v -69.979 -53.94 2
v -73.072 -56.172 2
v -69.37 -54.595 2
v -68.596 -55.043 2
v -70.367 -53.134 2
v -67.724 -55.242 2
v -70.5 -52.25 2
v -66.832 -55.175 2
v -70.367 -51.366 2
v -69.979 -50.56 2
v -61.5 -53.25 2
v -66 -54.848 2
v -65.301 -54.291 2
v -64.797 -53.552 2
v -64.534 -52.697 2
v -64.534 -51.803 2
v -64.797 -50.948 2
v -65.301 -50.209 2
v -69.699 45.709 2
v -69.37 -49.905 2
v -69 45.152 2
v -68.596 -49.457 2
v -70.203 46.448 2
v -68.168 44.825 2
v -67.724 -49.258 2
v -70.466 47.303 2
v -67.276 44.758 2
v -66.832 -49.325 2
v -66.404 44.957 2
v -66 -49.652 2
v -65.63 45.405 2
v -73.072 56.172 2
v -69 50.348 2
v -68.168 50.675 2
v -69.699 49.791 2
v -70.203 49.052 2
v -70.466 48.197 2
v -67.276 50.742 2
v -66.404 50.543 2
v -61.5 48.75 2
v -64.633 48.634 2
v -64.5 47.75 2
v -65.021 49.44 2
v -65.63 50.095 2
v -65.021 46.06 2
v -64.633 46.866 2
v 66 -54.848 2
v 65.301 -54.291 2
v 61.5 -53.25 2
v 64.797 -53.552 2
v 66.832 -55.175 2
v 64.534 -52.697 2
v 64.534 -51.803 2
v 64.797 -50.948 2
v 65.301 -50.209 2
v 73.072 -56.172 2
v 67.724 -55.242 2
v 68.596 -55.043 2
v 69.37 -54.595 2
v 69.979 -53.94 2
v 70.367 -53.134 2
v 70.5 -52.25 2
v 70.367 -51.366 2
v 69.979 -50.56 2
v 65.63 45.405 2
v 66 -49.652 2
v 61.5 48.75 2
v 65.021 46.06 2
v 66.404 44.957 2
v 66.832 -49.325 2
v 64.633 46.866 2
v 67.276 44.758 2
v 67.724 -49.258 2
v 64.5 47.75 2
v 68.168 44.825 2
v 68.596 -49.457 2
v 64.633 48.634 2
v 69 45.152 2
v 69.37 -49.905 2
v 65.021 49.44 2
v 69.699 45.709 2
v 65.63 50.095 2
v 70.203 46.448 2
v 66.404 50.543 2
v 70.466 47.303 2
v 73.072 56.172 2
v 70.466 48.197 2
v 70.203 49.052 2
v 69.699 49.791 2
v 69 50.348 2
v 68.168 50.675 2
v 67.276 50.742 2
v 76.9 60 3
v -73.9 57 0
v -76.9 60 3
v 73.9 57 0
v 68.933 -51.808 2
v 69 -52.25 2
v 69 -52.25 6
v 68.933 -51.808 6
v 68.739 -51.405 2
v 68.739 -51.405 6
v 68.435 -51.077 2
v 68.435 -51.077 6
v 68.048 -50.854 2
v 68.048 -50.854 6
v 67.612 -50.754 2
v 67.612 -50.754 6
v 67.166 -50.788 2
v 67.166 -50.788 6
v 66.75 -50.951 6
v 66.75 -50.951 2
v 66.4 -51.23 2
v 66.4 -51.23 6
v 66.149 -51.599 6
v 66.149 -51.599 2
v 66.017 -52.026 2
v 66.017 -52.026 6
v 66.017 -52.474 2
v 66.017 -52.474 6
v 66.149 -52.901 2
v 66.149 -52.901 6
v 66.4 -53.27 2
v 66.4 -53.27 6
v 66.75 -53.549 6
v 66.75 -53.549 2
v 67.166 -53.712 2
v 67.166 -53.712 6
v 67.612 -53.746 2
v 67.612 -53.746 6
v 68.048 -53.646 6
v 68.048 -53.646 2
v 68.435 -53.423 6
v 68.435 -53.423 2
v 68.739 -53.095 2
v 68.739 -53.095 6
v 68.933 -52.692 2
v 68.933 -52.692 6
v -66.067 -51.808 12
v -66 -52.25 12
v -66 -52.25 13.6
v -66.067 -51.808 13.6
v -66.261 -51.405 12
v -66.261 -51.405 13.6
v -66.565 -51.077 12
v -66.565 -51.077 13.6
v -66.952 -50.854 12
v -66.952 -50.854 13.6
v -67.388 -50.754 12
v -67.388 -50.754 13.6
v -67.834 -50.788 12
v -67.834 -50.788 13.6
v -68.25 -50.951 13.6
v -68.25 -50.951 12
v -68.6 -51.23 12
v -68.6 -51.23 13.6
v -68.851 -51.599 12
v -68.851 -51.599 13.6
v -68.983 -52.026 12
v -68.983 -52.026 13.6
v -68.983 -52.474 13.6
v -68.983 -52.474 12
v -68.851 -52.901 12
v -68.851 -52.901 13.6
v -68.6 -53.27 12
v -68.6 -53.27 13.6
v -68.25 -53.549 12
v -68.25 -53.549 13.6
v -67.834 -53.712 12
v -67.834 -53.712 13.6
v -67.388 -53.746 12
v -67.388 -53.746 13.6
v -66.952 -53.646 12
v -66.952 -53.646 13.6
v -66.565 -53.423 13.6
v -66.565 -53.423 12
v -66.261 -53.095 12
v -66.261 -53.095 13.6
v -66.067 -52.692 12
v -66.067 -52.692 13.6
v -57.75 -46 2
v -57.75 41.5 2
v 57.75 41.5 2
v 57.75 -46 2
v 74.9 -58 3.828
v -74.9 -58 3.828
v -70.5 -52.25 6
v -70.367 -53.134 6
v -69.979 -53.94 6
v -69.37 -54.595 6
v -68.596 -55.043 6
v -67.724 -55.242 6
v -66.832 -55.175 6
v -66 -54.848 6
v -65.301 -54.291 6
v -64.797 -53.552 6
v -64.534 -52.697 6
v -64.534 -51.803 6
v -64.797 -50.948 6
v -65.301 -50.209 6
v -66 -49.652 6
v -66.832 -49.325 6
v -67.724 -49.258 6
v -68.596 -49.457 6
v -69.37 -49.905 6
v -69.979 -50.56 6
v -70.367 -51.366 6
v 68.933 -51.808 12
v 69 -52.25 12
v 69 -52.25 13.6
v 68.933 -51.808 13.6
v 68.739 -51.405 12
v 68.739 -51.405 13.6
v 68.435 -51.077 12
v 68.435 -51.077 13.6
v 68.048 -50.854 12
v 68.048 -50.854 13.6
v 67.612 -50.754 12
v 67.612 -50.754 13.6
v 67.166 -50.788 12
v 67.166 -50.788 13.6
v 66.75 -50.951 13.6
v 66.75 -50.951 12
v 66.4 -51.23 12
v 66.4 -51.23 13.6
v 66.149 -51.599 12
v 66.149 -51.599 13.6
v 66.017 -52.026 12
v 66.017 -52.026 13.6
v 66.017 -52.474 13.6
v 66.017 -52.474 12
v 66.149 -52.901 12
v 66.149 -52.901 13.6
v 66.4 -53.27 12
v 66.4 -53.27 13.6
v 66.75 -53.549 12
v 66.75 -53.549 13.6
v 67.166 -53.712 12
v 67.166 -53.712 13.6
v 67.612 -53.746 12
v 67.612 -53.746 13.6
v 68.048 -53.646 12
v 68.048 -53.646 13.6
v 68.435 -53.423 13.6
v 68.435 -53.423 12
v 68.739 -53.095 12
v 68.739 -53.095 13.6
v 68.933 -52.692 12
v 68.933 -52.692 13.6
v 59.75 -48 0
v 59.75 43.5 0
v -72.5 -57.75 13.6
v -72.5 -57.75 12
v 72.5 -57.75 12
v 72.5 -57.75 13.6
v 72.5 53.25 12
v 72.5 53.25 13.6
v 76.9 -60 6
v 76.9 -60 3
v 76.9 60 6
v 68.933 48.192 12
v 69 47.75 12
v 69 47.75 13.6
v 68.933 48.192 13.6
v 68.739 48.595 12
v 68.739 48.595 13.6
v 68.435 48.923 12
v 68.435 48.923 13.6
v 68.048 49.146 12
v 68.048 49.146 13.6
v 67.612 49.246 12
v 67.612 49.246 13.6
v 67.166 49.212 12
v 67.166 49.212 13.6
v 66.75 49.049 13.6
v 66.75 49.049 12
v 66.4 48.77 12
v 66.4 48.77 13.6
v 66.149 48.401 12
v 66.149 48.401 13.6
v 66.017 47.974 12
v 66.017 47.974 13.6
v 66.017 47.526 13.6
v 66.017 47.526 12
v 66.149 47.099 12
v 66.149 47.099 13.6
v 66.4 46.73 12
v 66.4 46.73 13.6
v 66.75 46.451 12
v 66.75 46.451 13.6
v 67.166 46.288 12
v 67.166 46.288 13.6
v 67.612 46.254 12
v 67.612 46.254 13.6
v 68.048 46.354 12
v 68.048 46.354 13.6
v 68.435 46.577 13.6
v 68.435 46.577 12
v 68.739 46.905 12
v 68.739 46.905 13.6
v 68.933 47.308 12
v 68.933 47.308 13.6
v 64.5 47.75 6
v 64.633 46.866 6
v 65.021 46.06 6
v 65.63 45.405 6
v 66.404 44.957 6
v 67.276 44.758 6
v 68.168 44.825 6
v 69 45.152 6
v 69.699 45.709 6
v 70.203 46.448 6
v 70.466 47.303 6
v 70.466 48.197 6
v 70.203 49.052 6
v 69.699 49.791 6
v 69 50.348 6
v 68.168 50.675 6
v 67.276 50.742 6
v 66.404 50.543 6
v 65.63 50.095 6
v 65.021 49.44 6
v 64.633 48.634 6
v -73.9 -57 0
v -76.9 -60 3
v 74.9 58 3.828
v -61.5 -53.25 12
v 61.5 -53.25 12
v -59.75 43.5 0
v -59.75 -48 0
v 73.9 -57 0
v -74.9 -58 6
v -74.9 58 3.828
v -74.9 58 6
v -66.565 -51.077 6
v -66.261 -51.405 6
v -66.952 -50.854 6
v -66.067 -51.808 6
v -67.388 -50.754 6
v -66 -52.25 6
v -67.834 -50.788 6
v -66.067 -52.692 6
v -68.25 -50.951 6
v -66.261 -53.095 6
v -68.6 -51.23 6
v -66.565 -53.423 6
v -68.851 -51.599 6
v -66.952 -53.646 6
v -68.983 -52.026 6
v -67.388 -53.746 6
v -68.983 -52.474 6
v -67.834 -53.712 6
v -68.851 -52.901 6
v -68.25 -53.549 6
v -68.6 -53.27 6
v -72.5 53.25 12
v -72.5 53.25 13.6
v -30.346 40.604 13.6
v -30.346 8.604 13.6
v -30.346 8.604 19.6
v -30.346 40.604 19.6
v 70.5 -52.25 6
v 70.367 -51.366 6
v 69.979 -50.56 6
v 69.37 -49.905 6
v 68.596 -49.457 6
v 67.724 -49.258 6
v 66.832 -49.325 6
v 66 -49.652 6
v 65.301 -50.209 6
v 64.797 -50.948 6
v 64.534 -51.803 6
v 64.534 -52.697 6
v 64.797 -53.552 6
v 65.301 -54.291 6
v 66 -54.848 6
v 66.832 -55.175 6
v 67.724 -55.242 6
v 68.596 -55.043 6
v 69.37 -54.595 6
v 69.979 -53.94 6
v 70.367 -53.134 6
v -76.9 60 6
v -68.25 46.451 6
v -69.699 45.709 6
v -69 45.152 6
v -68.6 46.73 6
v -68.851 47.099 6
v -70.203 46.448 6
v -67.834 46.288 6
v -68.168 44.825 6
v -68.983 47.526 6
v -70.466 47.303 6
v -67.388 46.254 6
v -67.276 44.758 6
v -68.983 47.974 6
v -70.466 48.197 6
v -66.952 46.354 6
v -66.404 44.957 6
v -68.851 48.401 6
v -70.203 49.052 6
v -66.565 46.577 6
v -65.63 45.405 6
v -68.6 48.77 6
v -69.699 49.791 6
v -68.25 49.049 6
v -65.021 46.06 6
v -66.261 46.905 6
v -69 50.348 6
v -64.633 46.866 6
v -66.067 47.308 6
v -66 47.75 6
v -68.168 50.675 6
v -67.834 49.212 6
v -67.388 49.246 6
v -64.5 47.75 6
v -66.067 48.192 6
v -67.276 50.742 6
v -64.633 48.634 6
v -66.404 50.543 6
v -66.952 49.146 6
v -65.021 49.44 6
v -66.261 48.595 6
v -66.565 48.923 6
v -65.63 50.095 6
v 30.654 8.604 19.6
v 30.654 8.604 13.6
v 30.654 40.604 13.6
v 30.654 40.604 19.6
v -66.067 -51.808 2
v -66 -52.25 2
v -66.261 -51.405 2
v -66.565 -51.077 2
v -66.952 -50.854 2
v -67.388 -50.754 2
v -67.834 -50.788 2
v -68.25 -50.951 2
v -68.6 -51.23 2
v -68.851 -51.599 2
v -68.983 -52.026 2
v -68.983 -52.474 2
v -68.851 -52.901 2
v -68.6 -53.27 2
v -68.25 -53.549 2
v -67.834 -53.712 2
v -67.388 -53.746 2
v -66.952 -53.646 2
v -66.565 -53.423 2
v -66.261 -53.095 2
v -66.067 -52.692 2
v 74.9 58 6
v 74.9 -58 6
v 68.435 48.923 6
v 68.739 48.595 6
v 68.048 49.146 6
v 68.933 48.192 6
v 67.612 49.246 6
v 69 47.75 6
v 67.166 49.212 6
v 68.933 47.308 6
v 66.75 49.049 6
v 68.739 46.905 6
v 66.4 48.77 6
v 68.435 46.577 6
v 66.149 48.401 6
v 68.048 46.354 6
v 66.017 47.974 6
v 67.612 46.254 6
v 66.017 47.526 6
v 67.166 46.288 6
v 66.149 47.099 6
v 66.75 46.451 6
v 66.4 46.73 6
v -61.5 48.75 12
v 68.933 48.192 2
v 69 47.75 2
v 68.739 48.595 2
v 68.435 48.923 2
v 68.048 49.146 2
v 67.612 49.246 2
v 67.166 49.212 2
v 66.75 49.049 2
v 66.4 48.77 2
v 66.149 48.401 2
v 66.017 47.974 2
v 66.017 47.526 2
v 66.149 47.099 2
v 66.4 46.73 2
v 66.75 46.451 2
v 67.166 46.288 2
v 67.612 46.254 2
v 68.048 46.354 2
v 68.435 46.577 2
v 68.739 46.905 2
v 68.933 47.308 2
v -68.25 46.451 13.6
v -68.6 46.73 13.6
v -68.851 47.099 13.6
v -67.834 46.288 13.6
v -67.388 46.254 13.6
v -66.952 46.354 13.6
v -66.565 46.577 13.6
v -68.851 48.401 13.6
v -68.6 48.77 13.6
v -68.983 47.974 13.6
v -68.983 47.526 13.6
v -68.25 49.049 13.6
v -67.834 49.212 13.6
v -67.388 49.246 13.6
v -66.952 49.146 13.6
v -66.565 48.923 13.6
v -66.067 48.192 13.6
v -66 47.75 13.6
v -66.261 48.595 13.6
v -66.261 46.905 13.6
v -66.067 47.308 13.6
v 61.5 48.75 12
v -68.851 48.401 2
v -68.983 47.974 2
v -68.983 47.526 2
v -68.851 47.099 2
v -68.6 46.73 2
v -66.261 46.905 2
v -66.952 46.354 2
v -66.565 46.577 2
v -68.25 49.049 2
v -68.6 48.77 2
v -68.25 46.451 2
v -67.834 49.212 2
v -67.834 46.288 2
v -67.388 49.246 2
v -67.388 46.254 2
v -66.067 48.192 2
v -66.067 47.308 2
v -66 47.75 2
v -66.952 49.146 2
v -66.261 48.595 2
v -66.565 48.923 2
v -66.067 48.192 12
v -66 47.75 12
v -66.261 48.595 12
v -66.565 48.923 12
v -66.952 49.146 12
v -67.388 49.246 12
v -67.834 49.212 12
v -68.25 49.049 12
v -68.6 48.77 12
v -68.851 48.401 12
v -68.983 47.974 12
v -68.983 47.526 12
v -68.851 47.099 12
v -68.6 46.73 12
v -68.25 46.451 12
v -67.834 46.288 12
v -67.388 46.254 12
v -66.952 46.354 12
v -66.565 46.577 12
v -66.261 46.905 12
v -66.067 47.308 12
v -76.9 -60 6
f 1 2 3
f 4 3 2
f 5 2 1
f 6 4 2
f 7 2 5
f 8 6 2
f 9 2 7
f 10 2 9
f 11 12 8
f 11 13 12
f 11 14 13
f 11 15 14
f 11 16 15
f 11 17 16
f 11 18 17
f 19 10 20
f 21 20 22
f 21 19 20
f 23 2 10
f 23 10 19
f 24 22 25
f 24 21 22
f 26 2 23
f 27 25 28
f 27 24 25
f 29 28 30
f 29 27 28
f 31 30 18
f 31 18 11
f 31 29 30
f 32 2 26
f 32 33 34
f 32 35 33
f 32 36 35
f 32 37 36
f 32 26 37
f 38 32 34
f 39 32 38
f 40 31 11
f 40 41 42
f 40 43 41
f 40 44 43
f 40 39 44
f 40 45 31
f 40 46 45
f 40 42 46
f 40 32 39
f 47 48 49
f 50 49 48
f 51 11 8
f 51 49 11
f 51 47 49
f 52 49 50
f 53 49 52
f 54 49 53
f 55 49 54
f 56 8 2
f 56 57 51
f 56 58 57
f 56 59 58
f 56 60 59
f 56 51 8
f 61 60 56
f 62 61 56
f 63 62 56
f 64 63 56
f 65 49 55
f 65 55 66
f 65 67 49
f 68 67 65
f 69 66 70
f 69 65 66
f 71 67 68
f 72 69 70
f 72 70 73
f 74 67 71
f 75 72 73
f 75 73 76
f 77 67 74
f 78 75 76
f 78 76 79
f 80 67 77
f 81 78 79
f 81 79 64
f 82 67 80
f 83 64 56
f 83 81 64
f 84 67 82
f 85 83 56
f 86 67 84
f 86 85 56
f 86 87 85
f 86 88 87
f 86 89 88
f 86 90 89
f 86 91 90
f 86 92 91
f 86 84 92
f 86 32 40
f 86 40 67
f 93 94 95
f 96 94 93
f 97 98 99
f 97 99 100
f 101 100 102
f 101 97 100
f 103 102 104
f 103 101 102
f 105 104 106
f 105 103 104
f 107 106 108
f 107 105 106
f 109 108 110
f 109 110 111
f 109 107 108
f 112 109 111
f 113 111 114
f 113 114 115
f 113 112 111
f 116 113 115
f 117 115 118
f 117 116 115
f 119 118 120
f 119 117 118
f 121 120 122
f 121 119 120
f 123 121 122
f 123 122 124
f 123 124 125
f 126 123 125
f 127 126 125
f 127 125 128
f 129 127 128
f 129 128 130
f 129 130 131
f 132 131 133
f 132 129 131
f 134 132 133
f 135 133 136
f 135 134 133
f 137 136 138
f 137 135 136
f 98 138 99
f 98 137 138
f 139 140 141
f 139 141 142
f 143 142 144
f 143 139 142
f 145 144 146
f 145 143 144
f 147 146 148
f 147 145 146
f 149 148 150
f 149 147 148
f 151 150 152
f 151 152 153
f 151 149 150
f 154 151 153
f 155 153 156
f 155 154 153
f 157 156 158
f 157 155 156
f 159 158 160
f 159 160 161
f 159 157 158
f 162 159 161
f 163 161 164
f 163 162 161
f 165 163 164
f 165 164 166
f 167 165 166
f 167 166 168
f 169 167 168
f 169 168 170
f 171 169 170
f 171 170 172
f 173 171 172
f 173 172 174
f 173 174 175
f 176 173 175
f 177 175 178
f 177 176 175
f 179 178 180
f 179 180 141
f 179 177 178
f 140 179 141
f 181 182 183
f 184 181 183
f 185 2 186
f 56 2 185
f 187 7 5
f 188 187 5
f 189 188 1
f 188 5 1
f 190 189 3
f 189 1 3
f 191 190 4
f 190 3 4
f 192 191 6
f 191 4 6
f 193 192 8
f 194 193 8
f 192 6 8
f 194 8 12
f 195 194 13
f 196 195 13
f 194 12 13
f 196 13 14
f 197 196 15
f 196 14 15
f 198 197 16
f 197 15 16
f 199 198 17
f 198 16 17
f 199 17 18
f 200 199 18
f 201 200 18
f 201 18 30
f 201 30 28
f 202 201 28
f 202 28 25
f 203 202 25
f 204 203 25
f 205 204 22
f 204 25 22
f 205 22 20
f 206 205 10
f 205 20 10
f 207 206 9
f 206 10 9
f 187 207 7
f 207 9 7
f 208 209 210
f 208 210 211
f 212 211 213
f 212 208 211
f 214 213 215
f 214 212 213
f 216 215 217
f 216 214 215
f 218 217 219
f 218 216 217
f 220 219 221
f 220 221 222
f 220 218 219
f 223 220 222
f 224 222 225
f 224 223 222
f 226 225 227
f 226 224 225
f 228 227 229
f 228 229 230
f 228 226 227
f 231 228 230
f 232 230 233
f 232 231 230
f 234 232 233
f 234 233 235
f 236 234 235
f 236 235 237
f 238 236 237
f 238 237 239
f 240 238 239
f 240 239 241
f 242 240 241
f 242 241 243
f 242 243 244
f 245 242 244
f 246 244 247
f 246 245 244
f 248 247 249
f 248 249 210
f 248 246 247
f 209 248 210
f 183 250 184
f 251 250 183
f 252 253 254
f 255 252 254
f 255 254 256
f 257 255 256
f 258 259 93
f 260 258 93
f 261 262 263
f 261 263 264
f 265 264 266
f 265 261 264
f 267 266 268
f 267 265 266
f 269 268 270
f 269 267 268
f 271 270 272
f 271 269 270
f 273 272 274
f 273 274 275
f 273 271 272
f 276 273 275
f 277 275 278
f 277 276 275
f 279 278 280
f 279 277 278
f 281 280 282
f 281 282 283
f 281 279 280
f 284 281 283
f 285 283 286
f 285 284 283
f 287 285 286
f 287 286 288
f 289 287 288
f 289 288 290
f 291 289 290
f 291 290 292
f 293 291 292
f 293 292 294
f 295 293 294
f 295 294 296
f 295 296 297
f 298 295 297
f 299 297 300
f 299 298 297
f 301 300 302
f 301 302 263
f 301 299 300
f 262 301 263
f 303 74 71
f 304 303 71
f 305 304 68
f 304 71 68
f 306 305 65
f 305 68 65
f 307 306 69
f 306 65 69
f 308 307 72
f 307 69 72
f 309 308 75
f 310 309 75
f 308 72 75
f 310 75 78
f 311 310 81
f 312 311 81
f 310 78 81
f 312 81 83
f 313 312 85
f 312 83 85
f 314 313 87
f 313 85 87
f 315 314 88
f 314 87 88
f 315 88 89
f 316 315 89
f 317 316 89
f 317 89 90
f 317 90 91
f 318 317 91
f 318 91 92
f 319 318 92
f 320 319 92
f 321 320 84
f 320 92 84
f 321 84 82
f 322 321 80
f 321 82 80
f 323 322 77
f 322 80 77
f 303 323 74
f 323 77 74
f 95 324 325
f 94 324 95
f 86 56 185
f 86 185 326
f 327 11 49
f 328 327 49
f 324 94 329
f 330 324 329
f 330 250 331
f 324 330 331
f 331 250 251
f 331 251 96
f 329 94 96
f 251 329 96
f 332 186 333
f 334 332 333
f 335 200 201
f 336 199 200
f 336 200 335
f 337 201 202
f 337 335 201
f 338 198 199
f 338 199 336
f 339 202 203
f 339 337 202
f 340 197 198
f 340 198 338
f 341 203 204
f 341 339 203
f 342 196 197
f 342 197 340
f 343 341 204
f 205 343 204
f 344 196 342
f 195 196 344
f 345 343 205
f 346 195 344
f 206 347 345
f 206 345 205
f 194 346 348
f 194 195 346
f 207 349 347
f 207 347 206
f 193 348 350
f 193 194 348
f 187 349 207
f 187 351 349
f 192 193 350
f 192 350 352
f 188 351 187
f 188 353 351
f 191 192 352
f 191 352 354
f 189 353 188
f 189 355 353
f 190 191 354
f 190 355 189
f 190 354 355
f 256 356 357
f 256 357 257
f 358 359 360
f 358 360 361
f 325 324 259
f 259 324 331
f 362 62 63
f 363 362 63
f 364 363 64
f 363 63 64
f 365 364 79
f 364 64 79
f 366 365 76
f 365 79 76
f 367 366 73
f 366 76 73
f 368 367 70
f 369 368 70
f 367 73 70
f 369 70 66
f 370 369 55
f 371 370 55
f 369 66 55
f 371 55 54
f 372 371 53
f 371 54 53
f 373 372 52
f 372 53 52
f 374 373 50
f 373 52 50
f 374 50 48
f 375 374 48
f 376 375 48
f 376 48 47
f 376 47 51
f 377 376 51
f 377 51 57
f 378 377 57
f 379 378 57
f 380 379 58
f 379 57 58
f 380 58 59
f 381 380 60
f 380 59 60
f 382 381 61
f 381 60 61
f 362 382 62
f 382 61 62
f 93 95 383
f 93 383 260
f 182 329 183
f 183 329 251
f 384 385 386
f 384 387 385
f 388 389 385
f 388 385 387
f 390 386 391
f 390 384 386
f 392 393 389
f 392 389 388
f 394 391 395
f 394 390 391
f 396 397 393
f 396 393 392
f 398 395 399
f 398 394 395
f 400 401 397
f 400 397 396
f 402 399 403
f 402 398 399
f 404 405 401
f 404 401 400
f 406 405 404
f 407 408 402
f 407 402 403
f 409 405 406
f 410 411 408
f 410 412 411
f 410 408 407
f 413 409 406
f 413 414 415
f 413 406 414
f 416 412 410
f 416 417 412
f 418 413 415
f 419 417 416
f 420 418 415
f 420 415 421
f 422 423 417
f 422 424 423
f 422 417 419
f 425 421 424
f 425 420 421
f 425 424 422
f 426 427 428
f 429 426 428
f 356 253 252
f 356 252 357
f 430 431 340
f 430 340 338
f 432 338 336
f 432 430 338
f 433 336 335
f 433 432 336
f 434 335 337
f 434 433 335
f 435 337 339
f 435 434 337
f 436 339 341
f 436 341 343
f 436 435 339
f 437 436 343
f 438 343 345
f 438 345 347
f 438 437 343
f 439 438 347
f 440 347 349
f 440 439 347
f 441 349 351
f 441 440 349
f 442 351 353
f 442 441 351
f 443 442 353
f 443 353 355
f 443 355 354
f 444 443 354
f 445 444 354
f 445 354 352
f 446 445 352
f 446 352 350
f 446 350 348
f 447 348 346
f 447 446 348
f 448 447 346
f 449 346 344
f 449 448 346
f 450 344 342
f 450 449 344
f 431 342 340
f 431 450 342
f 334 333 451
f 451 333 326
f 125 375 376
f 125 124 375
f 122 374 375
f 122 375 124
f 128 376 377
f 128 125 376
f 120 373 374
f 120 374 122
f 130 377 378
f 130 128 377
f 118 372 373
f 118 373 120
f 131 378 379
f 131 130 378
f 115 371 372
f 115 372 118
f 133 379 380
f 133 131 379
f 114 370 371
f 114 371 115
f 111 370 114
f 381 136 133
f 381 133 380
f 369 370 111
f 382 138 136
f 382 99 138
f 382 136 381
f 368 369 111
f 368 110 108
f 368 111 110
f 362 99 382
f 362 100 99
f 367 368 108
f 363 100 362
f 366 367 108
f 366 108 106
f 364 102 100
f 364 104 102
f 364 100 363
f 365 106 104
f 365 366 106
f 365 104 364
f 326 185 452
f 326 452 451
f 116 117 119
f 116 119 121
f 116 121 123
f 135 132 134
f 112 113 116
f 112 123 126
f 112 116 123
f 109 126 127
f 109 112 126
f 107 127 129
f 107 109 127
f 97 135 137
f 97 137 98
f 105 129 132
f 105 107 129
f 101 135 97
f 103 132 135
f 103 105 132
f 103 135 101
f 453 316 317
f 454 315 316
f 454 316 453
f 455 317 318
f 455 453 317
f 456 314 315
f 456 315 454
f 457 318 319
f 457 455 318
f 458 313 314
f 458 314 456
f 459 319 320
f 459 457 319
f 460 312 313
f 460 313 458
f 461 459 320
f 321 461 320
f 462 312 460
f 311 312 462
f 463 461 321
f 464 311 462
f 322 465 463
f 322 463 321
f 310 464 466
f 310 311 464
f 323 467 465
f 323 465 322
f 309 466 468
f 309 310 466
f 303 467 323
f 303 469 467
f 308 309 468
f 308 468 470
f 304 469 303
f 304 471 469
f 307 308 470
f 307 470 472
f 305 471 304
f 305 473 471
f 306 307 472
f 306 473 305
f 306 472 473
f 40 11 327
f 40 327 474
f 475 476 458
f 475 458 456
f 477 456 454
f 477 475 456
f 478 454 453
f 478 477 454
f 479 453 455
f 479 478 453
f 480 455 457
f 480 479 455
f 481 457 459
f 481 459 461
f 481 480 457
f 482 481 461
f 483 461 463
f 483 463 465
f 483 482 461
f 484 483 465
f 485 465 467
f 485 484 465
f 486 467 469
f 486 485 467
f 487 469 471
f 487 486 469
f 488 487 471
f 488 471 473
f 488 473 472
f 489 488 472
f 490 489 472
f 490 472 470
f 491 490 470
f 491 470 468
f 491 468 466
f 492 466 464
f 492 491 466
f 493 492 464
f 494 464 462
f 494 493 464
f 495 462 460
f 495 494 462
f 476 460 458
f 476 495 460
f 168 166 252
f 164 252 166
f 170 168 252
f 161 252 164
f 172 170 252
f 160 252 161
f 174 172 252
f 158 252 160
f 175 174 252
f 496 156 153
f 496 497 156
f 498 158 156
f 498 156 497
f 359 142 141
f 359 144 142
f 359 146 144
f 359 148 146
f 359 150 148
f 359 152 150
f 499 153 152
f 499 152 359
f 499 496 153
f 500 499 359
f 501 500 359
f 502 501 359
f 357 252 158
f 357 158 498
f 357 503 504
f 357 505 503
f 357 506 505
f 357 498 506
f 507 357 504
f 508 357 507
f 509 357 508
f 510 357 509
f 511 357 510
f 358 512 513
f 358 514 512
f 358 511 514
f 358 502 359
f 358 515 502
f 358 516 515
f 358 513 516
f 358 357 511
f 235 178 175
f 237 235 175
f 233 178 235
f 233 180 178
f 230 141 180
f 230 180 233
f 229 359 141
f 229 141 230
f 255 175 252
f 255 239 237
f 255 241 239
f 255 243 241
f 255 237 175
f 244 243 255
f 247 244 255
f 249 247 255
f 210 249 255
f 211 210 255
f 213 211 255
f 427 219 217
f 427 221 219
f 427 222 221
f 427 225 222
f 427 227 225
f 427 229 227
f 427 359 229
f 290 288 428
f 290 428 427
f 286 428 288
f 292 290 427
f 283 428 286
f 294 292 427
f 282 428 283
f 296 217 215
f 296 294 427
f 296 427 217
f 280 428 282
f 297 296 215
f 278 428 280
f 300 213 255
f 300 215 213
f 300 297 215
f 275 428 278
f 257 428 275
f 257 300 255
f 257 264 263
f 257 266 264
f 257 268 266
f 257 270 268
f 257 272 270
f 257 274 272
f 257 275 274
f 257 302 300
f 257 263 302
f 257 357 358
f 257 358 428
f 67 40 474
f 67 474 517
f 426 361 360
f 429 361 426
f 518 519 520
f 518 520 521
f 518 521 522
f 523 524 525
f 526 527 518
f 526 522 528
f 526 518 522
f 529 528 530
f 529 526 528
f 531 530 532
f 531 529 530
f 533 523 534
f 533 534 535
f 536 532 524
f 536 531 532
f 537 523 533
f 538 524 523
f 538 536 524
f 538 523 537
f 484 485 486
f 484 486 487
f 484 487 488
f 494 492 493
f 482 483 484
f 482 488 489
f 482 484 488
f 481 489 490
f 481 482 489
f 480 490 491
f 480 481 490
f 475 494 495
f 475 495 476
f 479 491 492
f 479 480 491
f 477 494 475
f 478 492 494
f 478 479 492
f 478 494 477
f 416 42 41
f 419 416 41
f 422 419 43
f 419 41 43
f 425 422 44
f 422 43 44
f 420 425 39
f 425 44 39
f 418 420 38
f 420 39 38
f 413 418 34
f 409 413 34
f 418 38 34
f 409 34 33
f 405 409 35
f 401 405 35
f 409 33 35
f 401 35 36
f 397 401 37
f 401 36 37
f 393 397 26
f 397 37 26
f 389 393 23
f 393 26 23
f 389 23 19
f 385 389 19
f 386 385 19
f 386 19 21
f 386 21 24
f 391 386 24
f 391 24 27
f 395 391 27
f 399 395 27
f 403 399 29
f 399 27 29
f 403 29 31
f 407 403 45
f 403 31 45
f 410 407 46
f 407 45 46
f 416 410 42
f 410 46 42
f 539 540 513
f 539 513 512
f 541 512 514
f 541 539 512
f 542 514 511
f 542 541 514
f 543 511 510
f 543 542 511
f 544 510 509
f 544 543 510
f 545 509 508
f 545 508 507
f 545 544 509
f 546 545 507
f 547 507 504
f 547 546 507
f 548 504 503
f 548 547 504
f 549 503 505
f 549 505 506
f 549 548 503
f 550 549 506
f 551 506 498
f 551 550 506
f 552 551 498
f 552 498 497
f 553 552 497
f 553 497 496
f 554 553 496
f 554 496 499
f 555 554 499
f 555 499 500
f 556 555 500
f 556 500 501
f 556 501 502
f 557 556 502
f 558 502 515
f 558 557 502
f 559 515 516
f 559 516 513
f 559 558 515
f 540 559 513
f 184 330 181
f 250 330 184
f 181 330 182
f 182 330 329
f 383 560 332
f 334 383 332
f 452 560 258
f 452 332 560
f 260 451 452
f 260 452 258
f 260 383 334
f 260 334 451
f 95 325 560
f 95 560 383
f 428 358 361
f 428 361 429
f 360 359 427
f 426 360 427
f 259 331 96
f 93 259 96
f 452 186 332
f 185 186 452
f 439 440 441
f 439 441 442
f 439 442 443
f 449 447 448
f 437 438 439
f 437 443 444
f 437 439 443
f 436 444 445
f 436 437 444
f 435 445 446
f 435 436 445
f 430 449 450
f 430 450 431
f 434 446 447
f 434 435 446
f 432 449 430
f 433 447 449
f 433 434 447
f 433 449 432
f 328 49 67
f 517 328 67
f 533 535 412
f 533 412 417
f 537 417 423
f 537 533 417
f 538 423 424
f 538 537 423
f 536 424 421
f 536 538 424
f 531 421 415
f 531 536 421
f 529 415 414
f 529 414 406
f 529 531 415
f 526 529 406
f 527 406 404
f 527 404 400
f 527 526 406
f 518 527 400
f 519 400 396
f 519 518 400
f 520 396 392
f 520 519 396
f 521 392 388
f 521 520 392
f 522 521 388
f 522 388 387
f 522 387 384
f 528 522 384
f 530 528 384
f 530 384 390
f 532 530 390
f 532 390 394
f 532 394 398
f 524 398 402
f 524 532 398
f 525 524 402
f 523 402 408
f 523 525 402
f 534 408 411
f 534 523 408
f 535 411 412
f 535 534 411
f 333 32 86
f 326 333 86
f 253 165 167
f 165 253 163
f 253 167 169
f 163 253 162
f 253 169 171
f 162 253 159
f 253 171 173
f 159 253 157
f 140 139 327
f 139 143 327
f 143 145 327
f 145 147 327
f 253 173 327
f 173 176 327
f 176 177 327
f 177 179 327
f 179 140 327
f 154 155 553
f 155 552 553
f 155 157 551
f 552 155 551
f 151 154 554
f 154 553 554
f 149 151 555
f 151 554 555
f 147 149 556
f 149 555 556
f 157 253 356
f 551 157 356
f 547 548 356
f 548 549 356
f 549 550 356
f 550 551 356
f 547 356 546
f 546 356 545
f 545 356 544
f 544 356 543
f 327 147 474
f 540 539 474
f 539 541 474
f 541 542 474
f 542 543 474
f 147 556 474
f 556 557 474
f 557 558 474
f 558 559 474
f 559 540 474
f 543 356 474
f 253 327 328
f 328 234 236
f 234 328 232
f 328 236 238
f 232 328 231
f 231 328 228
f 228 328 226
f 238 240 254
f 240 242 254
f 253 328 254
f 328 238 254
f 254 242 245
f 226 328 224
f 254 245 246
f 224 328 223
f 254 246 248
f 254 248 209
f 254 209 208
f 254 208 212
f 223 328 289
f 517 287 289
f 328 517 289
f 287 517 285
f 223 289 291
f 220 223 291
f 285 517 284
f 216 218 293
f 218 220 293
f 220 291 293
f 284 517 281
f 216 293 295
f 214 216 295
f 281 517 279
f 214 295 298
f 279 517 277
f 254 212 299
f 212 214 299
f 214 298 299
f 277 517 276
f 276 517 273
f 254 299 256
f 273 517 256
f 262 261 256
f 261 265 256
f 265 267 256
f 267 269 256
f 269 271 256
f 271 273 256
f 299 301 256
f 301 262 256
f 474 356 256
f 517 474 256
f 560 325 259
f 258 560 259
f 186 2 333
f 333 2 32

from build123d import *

# Parameters (mm, degrees)
SKETCH_1_W          = 153.8
SKETCH_1_H          = 120
SKETCH_1_W_2        = 113.5
SKETCH_1_H_2        = 85.5
EXTRUDE_1_DEPTH     = 6
CHAMFER_1_SIZE      = 3
SHELL_1_T           = -2
SKETCH_3_W          = 121.15685425
SKETCH_3_H          = 93.15685425
CUT_EXTRUDE_1_DEPTH = 4
SKETCH_4_R          = 3
SKETCH_4_R_2        = 1.5
EXTRUDE_3_DEPTH     = 4
SKETCH_2_W          = 123
SKETCH_2_H          = 102
EXTRUDE_2_DEPTH     = 10
SKETCH_5_W          = 145
SKETCH_5_H          = 111
EXTRUDE_4_DEPTH     = 1.6
CUT_EXTRUDE_START   = -1.6
SKETCH_6_R          = 1.5
CUT_EXTRUDE_2_DEPTH = 1.6
SKETCH_7_W          = 61
SKETCH_7_H          = 32
EXTRUDE_5_DEPTH     = 6


with BuildPart() as part:
    # 草图1 → 凸台-拉伸1 (new body)
    with BuildSketch(Plane.XY):
        Rectangle(SKETCH_1_W, SKETCH_1_H)
        with Locations((0, -2.25)):
            Rectangle(SKETCH_1_W_2, SKETCH_1_H_2, mode=Mode.SUBTRACT)
    extrude(amount=EXTRUDE_1_DEPTH)

    # 倒角1
    chamfer_1_edges = [part.edges().sort_by_distance(p)[0] for p in [
        (56.75, -2.25, 0),
        (0, 40.5, 0),
        (-56.75, -2.25, 0),
        (0, -45, 0),
        (0, 60, 0),
        (76.9, 0, 0),
        (0, -60, 0),
        (-76.9, 0, 0),
    ]]
    chamfer(chamfer_1_edges, length=CHAMFER_1_SIZE)

    # 抽壳1
    shell_1_openings = [part.faces().sort_by_distance(p)[0] for p in [
        (0, 58.049245274, 6),
    ]]
    offset(amount=SHELL_1_T, openings=shell_1_openings, kind=Kind.INTERSECTION)

    # 草图3 → 切除-拉伸1 (cut)
    with BuildSketch(Plane.XY.offset(6)):
        with Locations((0, -2.25)):
            Rectangle(SKETCH_3_W, SKETCH_3_H)
    extrude(amount=-CUT_EXTRUDE_1_DEPTH, mode=Mode.SUBTRACT)

    # 草图4 → 凸台-拉伸3 (add)
    # profile 1 of 4: a face of its own
    with BuildSketch(Plane.XY.offset(2)):
        with Locations((-67.5, 47.75)):
            Circle(SKETCH_4_R)
        with Locations((-67.5, 47.75)):
            Circle(SKETCH_4_R_2, mode=Mode.SUBTRACT)
    # profile 2 of 4: a face of its own
    with BuildSketch(Plane.XY.offset(2)):
        with Locations(Location((67.5, 47.75, 0), (0, 0, 180))):
            Circle(SKETCH_4_R)
        with Locations((67.5, 47.75)):
            Circle(SKETCH_4_R_2, mode=Mode.SUBTRACT)
    # profile 3 of 4: a face of its own
    with BuildSketch(Plane.XY.offset(2)):
        with Locations((67.5, -52.25)):
            Circle(SKETCH_4_R)
        with Locations((67.5, -52.25)):
            Circle(SKETCH_4_R_2, mode=Mode.SUBTRACT)
    # profile 4 of 4: a face of its own
    with BuildSketch(Plane.XY.offset(2)):
        with Locations(Location((-67.5, -52.25, 0), (0, 0, 180))):
            Circle(SKETCH_4_R)
        with Locations((-67.5, -52.25)):
            Circle(SKETCH_4_R_2, mode=Mode.SUBTRACT)
    extrude(amount=EXTRUDE_3_DEPTH)

    # 草图2 → 凸台-拉伸2 (add)
    with BuildSketch(Plane.XY.offset(2)):
        with Locations((0, -2.25)):
            Rectangle(SKETCH_2_W, SKETCH_2_H)
    extrude(amount=EXTRUDE_2_DEPTH)

    # 草图5 → 凸台-拉伸4 (add)
    with BuildSketch(Plane.XY.offset(12)):
        with Locations((0, -2.25)):
            Rectangle(SKETCH_5_W, SKETCH_5_H)
    extrude(amount=EXTRUDE_4_DEPTH)

    # 草图6 → 切除-拉伸2 (cut)
    with BuildSketch(Plane.XY.offset(13.6).offset(CUT_EXTRUDE_START)):
        with Locations((-67.5, 47.75)):
            Circle(SKETCH_6_R)
        with Locations((67.5, 47.75)):
            Circle(SKETCH_6_R)
        with Locations((67.5, -52.25)):
            Circle(SKETCH_6_R)
        with Locations((-67.5, -52.25)):
            Circle(SKETCH_6_R)
    extrude(amount=CUT_EXTRUDE_2_DEPTH, mode=Mode.SUBTRACT)

    # 草图7 → 凸台-拉伸5 (add)
    with BuildSketch(Plane.XY.offset(13.6)):
        with Locations((0.153519833, 24.604445294)):
            Rectangle(SKETCH_7_W, SKETCH_7_H)
    extrude(amount=EXTRUDE_5_DEPTH)


solid = part.part
